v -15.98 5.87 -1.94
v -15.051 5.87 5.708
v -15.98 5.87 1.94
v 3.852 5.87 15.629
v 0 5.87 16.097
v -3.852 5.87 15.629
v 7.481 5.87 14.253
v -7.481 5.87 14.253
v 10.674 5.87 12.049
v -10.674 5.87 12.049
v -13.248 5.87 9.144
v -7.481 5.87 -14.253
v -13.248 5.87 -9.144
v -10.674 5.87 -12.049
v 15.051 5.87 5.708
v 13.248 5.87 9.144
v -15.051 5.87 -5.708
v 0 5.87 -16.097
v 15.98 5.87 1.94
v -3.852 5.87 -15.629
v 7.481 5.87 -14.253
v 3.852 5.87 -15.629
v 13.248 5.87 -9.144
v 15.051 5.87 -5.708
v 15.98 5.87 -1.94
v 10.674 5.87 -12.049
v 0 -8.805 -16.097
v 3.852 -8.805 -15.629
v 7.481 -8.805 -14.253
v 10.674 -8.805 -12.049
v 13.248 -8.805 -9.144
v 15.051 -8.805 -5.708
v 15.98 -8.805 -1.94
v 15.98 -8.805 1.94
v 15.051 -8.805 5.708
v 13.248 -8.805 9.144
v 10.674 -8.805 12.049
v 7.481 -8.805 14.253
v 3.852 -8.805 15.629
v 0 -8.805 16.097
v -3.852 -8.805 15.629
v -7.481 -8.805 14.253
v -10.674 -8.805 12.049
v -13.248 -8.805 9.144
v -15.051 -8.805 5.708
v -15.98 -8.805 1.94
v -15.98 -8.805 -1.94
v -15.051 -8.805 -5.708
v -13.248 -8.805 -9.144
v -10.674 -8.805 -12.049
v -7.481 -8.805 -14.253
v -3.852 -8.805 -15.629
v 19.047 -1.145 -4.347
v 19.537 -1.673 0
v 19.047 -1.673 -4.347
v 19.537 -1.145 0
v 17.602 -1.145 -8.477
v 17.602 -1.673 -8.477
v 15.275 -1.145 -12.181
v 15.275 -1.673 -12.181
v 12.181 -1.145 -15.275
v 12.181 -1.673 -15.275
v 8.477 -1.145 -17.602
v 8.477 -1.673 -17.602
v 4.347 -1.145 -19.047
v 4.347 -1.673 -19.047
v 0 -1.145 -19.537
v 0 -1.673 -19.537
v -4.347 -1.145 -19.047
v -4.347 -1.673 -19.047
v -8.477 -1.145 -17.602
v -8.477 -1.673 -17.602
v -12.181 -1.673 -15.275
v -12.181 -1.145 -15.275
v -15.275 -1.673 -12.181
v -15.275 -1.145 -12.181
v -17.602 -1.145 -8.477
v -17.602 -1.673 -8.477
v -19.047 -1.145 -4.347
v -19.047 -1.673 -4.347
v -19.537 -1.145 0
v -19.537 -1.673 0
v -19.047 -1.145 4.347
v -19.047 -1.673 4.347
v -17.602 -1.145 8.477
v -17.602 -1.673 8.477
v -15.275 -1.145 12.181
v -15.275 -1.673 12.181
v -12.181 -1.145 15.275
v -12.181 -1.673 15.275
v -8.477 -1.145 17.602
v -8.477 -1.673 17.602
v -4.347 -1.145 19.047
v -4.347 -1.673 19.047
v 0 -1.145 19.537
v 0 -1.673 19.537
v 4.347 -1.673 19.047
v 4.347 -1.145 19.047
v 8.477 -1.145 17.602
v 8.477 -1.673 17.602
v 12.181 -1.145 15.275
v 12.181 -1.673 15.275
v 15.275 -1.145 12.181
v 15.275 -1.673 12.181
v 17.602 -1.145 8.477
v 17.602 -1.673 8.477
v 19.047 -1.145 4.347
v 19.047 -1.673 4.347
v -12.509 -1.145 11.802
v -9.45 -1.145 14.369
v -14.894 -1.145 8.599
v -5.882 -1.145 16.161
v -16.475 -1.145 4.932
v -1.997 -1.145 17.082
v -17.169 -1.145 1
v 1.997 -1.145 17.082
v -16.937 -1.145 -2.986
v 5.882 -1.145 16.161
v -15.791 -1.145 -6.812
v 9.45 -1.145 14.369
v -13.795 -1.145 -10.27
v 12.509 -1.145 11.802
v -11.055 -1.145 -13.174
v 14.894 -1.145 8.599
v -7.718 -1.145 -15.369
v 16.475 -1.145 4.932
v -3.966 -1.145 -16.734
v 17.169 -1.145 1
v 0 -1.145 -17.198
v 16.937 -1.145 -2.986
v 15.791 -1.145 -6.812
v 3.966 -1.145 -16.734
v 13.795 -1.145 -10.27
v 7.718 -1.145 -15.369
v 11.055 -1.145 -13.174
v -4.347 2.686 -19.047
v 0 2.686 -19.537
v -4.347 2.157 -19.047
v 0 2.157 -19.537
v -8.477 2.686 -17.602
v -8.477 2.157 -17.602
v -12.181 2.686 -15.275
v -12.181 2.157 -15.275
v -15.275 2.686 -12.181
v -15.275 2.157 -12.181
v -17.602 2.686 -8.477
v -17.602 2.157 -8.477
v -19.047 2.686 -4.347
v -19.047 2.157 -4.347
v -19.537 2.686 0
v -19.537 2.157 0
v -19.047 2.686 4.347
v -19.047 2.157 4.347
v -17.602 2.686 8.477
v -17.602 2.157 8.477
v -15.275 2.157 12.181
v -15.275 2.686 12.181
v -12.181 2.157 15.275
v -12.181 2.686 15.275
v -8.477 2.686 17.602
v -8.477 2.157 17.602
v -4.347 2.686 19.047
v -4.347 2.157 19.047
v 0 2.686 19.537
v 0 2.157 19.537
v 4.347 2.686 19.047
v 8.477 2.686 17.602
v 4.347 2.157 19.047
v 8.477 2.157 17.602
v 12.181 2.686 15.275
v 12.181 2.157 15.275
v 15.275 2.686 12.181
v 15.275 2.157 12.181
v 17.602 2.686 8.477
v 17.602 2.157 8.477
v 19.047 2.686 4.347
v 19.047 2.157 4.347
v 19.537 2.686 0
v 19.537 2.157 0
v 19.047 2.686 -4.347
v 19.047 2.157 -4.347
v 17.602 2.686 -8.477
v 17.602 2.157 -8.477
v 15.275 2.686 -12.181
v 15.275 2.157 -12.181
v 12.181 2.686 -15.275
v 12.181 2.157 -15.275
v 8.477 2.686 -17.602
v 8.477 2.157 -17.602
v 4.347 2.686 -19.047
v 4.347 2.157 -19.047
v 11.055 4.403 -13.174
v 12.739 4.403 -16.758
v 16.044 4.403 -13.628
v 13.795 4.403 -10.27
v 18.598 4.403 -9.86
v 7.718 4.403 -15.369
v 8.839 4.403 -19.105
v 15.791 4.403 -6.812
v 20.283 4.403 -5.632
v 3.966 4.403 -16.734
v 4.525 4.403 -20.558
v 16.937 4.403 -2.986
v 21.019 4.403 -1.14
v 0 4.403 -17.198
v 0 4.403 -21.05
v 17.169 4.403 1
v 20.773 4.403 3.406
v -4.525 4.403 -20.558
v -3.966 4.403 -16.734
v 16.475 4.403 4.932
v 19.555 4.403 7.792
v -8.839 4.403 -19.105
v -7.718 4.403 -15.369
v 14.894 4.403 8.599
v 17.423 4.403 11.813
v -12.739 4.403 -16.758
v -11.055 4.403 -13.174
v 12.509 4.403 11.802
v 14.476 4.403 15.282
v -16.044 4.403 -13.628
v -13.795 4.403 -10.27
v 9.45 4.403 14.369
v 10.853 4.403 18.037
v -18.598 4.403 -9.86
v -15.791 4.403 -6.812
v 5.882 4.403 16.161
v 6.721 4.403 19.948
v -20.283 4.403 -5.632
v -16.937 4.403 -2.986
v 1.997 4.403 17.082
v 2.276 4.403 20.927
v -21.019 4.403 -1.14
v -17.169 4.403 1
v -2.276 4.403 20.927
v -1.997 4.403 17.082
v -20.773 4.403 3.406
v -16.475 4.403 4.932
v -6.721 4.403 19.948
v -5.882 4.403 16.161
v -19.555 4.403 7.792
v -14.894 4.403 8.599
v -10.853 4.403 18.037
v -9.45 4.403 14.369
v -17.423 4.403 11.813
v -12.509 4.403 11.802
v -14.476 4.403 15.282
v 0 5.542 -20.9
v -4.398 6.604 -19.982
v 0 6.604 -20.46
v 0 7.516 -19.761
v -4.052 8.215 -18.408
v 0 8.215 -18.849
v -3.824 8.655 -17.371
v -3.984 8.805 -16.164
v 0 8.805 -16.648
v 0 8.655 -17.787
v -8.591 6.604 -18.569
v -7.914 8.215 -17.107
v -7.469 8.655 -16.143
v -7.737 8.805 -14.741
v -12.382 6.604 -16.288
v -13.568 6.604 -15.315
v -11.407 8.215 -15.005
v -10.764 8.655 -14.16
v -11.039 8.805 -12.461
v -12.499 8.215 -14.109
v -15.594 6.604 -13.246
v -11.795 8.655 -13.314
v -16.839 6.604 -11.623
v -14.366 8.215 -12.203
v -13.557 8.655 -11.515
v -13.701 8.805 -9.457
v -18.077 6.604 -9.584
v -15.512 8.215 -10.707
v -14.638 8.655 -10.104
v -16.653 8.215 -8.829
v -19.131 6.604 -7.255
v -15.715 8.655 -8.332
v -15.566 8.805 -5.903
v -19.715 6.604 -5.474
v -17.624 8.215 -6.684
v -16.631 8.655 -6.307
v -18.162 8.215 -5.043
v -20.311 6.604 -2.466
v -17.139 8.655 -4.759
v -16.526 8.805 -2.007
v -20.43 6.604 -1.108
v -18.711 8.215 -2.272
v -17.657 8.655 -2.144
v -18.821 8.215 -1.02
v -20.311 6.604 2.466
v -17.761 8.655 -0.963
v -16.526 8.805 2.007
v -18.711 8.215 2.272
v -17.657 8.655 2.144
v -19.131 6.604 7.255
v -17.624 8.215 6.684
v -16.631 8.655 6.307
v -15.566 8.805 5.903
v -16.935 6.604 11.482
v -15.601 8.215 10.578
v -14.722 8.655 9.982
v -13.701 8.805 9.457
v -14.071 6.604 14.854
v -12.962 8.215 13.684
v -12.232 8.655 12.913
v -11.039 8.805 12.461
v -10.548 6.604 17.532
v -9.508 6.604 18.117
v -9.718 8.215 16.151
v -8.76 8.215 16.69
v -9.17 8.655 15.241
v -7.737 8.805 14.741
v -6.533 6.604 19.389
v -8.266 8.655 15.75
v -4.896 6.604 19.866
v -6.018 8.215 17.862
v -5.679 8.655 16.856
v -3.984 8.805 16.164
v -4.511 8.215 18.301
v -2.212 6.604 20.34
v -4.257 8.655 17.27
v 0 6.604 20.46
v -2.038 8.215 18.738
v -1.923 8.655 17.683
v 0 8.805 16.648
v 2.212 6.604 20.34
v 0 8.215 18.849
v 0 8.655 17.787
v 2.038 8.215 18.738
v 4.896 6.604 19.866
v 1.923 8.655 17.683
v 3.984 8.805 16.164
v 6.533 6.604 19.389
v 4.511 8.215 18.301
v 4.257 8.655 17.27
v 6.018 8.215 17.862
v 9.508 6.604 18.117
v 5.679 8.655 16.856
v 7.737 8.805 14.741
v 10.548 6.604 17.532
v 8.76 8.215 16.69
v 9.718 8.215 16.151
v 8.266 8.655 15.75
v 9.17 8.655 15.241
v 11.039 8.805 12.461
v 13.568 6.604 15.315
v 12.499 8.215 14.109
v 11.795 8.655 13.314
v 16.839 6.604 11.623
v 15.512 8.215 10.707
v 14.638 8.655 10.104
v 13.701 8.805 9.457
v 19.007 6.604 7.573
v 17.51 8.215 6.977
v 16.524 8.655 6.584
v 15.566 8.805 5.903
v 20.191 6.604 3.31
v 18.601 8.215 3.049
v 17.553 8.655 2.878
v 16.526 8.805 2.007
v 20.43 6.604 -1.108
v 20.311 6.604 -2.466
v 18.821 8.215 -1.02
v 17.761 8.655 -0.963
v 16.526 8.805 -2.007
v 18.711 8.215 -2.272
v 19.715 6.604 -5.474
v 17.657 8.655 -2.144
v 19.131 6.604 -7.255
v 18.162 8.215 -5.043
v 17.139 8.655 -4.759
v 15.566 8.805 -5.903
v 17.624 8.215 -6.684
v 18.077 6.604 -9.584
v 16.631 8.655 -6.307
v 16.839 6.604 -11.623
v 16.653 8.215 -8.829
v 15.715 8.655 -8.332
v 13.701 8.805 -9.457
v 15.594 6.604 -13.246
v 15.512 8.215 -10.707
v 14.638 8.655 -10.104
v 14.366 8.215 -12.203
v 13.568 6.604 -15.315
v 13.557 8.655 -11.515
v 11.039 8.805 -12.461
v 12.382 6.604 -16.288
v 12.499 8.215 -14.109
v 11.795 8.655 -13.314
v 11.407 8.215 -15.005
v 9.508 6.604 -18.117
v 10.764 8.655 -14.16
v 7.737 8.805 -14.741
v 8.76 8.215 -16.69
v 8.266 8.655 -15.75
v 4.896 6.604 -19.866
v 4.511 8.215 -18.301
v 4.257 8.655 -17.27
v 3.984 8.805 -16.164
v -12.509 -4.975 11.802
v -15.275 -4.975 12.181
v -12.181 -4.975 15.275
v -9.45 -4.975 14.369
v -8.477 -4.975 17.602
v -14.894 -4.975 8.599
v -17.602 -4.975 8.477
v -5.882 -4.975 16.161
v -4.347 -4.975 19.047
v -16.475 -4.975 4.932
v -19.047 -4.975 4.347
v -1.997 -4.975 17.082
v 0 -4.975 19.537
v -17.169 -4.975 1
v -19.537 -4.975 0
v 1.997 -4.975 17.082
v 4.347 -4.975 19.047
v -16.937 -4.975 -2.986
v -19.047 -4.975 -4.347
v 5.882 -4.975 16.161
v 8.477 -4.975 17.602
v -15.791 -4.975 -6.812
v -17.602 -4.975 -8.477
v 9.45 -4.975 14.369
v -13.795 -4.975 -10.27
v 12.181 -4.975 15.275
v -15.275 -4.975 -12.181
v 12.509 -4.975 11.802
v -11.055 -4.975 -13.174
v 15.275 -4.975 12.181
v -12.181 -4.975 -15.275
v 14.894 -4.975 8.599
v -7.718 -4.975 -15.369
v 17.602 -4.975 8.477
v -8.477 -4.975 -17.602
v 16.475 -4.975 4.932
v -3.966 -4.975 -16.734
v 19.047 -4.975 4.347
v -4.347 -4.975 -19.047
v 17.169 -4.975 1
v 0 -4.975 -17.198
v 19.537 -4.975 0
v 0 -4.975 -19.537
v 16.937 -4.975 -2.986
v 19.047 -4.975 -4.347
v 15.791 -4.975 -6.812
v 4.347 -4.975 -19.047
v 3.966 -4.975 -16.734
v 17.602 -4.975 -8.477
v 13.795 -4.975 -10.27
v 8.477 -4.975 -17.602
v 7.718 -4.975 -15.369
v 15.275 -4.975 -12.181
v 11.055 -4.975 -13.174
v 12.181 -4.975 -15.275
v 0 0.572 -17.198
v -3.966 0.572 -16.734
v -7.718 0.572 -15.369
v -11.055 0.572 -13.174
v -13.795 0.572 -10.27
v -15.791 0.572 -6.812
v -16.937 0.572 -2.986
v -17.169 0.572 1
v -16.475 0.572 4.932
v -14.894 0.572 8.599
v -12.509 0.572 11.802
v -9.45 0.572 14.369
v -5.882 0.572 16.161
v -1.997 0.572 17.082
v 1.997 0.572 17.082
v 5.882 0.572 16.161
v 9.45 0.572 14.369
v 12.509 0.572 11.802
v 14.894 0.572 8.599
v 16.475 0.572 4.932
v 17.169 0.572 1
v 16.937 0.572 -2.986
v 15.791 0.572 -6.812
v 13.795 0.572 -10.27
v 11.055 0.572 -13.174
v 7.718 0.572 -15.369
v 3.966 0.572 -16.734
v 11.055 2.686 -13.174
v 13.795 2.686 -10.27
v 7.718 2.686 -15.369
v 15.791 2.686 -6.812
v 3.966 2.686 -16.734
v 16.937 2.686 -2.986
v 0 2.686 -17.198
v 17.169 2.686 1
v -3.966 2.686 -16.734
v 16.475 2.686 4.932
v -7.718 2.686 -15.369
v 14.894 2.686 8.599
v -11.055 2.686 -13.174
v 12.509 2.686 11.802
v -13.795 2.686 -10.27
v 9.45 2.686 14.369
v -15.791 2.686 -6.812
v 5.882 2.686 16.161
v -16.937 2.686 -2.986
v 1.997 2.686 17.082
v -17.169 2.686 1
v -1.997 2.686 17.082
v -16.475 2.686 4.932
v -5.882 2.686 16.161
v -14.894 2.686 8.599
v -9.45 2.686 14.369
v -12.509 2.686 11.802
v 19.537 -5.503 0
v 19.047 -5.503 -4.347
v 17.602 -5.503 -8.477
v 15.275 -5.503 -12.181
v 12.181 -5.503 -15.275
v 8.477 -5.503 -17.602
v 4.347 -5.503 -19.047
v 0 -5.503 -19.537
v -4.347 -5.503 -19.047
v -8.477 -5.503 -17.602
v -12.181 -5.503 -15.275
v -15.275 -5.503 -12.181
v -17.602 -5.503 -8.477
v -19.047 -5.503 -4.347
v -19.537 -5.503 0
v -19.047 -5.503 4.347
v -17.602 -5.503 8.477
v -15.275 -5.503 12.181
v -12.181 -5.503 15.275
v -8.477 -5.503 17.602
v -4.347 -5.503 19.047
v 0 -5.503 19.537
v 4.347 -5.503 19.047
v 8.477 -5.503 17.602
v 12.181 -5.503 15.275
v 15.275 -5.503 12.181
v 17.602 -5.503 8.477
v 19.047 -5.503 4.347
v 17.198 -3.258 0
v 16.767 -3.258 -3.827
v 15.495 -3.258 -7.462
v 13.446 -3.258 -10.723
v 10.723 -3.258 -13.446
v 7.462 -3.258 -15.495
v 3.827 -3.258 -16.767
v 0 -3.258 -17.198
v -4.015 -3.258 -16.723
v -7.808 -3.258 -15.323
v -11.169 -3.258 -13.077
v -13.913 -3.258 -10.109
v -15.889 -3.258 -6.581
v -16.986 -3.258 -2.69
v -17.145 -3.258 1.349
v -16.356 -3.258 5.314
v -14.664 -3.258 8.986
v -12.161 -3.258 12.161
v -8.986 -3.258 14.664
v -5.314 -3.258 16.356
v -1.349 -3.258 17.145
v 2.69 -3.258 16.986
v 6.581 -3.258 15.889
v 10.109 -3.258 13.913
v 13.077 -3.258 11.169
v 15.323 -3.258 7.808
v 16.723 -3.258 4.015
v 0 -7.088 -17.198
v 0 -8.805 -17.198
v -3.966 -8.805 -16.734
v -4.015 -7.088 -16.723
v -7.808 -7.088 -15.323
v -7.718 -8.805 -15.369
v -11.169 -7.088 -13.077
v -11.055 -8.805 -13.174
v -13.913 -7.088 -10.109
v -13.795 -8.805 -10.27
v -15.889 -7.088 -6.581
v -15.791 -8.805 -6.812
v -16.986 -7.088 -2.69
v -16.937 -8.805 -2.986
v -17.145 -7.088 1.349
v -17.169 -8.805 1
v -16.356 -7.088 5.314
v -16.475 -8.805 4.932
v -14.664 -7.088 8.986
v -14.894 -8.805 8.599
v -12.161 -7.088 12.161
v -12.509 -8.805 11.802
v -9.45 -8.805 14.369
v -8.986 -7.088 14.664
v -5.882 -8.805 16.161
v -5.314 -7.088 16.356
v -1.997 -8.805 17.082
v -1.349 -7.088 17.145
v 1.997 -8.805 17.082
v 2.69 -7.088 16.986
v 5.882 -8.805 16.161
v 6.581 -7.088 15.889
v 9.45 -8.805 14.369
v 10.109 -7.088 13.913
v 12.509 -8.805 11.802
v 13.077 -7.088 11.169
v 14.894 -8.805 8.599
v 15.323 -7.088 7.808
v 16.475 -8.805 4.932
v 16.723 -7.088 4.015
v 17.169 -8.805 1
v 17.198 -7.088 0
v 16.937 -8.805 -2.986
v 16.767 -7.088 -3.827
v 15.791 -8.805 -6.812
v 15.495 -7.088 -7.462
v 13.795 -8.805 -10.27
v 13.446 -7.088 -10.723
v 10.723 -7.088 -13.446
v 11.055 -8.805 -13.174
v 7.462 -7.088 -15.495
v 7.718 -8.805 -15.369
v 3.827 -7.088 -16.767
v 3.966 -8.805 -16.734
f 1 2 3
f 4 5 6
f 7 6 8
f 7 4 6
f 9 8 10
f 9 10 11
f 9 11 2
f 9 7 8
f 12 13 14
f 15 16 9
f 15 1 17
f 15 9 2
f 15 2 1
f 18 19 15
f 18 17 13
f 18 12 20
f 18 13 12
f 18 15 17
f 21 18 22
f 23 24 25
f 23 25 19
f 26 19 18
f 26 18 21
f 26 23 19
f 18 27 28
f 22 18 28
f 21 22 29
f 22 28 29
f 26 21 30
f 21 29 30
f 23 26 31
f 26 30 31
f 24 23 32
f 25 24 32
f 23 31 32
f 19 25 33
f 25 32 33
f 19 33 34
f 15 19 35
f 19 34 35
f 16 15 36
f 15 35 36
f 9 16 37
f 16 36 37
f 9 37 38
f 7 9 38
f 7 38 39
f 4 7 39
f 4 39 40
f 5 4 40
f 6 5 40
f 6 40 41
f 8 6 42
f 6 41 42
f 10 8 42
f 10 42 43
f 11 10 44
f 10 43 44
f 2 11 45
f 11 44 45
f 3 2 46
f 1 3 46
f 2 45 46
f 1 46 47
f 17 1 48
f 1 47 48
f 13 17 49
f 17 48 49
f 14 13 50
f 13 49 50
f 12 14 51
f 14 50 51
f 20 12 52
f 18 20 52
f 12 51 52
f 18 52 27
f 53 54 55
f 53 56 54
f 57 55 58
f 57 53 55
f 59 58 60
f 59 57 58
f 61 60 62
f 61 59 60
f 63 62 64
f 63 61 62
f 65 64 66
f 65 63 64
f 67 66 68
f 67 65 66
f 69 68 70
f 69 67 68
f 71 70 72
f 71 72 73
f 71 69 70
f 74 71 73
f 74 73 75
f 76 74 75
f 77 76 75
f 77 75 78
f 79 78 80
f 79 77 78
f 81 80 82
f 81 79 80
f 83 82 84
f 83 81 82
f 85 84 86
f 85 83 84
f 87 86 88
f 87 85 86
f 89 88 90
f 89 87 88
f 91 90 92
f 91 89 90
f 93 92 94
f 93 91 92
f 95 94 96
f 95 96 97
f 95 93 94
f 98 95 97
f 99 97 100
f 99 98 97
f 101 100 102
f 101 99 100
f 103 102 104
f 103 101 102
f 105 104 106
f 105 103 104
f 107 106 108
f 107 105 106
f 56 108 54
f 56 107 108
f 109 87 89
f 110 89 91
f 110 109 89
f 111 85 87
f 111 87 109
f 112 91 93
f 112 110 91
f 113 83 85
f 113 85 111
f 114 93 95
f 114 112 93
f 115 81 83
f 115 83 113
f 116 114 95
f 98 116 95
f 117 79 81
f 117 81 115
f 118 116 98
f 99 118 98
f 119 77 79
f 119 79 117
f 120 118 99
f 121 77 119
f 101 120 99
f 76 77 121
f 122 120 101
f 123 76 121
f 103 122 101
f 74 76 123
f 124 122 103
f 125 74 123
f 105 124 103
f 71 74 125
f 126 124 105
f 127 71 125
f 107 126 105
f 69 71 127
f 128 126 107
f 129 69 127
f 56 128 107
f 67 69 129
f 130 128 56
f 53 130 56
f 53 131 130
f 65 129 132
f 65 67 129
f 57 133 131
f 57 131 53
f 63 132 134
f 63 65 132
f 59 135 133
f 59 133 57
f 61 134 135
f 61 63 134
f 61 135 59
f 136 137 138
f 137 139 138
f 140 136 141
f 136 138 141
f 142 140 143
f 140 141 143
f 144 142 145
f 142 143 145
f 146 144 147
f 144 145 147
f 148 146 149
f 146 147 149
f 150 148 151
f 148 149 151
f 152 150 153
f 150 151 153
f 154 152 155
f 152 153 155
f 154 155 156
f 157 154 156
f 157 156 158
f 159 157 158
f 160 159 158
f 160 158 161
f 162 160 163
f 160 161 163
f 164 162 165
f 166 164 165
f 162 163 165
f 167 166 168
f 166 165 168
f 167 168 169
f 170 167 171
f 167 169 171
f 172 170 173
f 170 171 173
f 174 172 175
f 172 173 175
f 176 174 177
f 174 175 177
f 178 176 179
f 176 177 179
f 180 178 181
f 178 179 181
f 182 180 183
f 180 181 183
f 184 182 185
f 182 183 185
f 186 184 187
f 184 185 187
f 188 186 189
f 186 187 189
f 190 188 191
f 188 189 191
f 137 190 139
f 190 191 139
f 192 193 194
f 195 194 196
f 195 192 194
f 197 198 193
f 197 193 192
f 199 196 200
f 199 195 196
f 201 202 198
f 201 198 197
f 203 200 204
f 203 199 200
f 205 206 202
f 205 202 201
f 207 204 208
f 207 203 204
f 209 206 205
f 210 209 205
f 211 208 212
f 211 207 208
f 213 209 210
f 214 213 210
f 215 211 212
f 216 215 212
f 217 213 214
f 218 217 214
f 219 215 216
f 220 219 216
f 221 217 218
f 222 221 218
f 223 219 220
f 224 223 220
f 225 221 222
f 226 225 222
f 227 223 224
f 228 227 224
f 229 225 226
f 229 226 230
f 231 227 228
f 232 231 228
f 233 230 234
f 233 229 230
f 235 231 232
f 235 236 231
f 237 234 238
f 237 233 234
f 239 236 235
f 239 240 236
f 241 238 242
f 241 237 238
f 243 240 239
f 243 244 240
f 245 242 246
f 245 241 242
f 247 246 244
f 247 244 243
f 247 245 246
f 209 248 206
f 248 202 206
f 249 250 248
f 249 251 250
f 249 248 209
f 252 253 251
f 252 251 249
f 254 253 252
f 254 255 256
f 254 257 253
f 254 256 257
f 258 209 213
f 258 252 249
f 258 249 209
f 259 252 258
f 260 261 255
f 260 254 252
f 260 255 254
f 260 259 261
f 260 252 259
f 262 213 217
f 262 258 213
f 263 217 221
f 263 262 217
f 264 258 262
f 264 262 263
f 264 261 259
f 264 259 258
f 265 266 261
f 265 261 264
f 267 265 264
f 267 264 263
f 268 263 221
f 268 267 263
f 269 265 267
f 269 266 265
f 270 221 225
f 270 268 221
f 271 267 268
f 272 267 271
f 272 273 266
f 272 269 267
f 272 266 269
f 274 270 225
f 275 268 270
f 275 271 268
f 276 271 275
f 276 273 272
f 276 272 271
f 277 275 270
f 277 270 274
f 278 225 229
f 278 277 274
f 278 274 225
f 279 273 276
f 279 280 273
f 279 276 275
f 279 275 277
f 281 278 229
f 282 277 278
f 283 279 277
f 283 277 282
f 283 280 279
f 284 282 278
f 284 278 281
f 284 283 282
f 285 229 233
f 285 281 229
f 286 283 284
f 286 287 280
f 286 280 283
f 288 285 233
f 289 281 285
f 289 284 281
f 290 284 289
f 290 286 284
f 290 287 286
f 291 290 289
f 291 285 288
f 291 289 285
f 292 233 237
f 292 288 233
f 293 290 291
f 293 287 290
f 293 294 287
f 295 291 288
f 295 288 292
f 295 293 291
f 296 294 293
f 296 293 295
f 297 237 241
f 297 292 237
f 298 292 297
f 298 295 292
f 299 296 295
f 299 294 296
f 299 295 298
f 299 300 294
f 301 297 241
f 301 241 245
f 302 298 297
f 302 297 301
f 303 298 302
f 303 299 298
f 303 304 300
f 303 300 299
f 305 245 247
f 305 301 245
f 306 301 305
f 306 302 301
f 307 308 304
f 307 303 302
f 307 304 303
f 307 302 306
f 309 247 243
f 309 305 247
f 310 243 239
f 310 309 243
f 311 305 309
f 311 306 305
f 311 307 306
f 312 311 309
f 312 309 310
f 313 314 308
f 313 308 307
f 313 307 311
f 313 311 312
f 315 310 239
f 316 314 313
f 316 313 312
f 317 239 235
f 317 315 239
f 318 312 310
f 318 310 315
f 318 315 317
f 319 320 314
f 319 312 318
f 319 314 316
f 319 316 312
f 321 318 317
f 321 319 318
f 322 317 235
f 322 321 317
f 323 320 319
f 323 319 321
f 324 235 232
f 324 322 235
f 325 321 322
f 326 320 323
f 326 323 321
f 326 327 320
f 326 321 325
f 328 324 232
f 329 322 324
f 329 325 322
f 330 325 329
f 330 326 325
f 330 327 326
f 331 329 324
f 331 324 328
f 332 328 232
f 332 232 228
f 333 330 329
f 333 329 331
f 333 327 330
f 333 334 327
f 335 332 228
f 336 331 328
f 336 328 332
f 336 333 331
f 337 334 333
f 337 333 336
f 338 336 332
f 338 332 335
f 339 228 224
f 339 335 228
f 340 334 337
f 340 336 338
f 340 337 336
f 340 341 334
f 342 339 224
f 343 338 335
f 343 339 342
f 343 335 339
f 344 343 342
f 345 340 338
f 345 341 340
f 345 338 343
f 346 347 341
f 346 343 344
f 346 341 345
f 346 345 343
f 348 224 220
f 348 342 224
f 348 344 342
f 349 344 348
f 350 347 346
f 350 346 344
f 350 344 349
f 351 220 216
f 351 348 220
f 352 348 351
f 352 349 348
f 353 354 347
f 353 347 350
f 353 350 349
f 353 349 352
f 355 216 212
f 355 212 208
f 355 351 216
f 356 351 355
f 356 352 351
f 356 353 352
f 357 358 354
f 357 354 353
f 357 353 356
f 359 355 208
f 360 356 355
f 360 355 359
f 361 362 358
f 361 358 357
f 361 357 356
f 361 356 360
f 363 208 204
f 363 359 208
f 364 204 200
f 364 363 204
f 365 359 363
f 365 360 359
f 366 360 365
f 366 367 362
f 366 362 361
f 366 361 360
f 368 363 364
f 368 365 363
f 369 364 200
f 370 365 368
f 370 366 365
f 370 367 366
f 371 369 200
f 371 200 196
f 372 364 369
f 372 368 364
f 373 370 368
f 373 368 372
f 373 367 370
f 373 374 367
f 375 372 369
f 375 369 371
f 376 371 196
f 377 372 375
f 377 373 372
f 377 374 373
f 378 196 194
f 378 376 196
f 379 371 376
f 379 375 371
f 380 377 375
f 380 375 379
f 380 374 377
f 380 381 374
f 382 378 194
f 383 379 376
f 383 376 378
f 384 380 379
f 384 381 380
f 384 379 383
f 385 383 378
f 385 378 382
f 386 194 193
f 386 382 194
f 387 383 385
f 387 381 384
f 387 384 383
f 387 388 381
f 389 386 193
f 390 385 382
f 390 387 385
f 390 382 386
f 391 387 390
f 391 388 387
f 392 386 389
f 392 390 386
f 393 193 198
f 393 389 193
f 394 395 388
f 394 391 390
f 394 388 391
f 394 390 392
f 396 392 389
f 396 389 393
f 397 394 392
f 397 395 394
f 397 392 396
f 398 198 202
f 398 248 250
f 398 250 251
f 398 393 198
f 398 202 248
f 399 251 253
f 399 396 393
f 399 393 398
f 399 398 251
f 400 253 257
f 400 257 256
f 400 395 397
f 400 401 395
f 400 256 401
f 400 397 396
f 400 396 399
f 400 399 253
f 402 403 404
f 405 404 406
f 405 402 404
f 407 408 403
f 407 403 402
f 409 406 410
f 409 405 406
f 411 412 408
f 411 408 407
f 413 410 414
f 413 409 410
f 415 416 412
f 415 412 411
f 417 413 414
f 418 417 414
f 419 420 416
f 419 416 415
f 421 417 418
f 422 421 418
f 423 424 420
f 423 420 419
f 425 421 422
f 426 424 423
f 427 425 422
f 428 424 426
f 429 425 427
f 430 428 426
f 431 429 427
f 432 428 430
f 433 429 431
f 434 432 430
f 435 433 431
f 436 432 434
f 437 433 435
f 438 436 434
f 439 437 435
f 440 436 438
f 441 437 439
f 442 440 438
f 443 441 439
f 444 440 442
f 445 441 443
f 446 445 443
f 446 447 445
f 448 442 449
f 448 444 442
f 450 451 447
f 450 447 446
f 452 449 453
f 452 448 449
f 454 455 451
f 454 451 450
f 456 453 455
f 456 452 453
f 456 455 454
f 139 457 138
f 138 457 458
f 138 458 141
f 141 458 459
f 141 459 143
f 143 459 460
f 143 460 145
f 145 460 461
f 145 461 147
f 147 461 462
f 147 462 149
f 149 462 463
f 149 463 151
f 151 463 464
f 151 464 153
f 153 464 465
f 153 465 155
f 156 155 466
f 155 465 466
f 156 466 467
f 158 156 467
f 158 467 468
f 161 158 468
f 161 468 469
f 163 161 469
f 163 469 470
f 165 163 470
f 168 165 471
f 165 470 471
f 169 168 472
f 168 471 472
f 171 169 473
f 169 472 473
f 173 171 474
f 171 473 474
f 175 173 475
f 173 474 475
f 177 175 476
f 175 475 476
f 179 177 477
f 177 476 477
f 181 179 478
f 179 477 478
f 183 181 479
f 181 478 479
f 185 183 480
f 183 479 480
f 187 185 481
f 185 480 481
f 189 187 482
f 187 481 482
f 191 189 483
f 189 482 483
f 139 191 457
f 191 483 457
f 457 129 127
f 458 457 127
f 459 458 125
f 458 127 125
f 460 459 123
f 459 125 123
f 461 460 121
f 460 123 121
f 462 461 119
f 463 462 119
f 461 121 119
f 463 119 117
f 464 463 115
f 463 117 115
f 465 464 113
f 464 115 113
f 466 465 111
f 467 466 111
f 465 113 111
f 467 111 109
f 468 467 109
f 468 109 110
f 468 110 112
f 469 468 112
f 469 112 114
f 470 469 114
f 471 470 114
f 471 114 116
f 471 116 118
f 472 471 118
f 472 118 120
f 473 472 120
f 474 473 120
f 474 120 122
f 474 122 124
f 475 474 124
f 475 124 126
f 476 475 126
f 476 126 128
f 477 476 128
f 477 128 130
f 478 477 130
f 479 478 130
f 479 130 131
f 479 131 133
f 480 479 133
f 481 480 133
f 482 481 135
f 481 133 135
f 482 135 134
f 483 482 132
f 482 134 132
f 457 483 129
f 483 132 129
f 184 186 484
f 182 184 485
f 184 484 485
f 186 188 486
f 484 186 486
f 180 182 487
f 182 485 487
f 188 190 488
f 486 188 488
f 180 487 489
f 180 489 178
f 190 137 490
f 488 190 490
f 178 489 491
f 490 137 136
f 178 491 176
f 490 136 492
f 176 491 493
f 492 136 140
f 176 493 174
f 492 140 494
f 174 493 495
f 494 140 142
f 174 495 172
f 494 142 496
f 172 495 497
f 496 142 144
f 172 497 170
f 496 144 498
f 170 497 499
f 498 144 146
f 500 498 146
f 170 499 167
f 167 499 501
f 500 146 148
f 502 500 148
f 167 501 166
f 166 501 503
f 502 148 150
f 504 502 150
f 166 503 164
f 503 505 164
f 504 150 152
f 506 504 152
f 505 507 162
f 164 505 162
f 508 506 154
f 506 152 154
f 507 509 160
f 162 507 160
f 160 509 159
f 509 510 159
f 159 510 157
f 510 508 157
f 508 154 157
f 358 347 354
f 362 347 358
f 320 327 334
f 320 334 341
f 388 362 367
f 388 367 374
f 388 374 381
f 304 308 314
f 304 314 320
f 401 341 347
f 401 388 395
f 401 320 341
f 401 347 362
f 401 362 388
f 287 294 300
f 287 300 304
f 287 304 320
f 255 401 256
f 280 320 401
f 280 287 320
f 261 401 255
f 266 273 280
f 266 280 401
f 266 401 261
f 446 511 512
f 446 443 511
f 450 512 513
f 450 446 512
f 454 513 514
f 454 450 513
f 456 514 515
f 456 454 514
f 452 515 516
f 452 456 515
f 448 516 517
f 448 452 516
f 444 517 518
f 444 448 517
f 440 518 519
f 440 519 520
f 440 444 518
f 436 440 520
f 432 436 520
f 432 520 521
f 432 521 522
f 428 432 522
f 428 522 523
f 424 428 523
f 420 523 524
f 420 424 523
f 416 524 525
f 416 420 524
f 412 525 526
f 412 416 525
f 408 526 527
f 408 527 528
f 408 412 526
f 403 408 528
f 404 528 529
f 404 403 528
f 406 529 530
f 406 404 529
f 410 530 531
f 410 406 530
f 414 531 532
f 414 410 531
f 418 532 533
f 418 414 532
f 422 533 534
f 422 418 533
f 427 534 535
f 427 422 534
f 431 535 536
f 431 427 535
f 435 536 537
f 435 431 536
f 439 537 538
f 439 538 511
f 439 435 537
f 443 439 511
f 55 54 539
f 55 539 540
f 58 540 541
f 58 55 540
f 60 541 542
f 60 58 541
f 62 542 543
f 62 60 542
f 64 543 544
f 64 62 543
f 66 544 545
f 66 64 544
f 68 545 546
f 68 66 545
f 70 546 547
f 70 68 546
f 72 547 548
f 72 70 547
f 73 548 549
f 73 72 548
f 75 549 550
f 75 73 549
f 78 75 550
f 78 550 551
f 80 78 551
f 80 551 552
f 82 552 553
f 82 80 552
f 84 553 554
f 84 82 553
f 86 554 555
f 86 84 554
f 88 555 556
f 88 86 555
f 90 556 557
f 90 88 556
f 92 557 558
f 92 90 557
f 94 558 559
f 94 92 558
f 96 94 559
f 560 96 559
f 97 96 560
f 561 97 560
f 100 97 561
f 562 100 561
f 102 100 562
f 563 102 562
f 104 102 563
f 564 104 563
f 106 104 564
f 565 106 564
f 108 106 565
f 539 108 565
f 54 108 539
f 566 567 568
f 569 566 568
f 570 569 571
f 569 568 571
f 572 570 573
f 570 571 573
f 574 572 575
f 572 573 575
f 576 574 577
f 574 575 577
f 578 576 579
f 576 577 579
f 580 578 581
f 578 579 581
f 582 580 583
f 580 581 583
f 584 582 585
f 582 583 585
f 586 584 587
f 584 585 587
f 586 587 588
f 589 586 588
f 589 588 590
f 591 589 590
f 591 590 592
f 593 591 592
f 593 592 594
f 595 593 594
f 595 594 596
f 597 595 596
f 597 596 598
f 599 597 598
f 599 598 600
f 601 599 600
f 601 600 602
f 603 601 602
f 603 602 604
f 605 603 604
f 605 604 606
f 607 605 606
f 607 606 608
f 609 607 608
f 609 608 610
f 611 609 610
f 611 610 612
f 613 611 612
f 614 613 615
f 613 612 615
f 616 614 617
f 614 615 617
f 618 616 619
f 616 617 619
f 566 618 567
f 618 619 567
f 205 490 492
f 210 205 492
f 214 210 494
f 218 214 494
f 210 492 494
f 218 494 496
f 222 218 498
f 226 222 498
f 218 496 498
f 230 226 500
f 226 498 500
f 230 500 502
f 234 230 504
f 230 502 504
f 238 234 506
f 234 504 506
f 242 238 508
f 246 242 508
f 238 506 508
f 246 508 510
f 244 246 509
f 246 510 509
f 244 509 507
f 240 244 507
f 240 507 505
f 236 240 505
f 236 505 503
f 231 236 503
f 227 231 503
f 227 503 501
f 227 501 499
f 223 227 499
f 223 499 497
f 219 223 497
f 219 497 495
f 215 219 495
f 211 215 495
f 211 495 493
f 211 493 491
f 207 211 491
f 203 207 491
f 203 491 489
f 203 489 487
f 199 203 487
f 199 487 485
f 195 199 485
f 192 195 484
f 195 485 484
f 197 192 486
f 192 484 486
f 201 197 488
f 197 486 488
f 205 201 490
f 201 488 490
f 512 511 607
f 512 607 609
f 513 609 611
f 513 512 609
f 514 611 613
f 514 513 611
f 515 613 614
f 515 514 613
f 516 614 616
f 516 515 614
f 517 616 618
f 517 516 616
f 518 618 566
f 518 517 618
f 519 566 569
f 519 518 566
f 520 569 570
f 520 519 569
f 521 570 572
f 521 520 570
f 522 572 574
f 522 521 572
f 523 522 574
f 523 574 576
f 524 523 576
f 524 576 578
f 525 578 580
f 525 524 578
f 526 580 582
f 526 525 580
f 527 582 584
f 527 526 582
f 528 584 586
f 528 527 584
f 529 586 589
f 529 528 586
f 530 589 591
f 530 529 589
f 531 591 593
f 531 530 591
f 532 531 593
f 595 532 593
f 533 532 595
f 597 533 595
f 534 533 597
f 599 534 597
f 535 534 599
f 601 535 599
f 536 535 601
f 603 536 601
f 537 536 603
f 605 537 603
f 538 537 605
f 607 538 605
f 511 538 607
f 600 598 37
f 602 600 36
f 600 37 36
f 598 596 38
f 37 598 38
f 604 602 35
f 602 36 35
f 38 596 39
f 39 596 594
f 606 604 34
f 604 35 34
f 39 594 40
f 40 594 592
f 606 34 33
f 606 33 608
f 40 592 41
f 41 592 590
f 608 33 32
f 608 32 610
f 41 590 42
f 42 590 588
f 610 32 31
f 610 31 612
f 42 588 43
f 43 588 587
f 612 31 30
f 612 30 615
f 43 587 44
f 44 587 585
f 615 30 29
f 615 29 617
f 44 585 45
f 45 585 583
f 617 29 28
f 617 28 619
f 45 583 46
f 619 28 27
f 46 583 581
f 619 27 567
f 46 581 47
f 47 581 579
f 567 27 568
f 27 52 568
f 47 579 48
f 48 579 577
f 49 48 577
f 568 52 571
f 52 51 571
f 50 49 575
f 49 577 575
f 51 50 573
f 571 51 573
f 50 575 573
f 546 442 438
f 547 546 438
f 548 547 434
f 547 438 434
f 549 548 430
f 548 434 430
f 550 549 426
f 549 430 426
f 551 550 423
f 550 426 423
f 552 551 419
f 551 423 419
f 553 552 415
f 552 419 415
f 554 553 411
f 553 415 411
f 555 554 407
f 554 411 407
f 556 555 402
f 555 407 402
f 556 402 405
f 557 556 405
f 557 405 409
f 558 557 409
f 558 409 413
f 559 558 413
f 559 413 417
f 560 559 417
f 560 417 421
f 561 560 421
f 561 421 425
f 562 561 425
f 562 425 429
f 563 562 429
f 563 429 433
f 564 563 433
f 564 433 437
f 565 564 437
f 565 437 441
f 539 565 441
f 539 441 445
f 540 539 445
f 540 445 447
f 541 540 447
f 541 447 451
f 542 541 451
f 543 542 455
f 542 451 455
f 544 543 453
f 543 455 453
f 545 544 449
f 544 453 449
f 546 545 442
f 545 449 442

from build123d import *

# Parameters (mm, degrees)
BOSS_EXTRUDE1_START = -8.805333
SKETCH5_R           = 17.197916667
BOSS_EXTRUDE1_DEPTH = 13.208
SKETCH6_R           = 16.09725
CUT_EXTRUDE1_DEPTH  = 14.675555556


# Read off the part's stored shape, not the designer's step: LPattern1
with BuildPart() as part:
    # Sketch4 → Revolve2 (revolve)
    with BuildSketch(Plane.XY, mode=Mode.PRIVATE) as revolve2_sk:
        with BuildLine():
            Line((0, 8.805333333), (0, 4.402666667))
            Line((0, 4.402666667), (21.05025, 4.402666667))
            ThreePointArc((21.05025, 4.402666667), (19.760738789, 7.515822122), (16.647583333, 8.805333333))
            Line((16.647583333, 8.805333333), (0, 8.805333333))
        make_face()
        Polygon((0, 2.685626667), (19.536840212, 2.685626667), (19.536840212, 2.157306667), (17.197916667, 0.572346667), (0, 0.572346667), align=None)
    revolve(revolve2_sk.sketch.rotate(Axis((0, -8.805333333, 0), (0, 1, 0)), 90), axis=Axis((0, -8.805333333, 0), (0, 1, 0)))



with BuildPart() as body_2:
    # LPattern1 outline → LPattern1 (revolve)
    with BuildSketch(Plane.XY):
        Polygon((19.536840212, -5.503333333), (19.536840212, -4.975013333), (0, -4.975013333), (0, -7.088293333), (17.197916667, -7.088293333), align=None)
        Polygon((0, -1.144693333), (0, -3.257973333), (17.197916667, -3.257973333), (19.536840213, -1.673013333), (19.536840212, -1.144693333), align=None)
    revolve(axis=Axis((0, 0, 0), (0, 1, 0)))


with BuildPart() as part_1:
    add(part.part)

    add(body_2.part)  # Boss-Extrude1 merges body 2
    # Sketch5 → Boss-Extrude1 (add)
    with BuildSketch(Plane(origin=(0, 0, 0), x_dir=(1, 0, 0), z_dir=(0, 1, 0)).offset(BOSS_EXTRUDE1_START)):
        with Locations(Location((0, 0, 0), (0, 0, 90))):
            Circle(SKETCH5_R)
    extrude(amount=BOSS_EXTRUDE1_DEPTH)

    # Sketch6 → Cut-Extrude1 (cut)
    with BuildSketch(Plane.XZ.offset(8.805333333)):
        with Locations(Location((0, 0, 0), (0, 0, 270))):
            Circle(SKETCH6_R)
    extrude(amount=-CUT_EXTRUDE1_DEPTH, mode=Mode.SUBTRACT)


solid = part_1.part
